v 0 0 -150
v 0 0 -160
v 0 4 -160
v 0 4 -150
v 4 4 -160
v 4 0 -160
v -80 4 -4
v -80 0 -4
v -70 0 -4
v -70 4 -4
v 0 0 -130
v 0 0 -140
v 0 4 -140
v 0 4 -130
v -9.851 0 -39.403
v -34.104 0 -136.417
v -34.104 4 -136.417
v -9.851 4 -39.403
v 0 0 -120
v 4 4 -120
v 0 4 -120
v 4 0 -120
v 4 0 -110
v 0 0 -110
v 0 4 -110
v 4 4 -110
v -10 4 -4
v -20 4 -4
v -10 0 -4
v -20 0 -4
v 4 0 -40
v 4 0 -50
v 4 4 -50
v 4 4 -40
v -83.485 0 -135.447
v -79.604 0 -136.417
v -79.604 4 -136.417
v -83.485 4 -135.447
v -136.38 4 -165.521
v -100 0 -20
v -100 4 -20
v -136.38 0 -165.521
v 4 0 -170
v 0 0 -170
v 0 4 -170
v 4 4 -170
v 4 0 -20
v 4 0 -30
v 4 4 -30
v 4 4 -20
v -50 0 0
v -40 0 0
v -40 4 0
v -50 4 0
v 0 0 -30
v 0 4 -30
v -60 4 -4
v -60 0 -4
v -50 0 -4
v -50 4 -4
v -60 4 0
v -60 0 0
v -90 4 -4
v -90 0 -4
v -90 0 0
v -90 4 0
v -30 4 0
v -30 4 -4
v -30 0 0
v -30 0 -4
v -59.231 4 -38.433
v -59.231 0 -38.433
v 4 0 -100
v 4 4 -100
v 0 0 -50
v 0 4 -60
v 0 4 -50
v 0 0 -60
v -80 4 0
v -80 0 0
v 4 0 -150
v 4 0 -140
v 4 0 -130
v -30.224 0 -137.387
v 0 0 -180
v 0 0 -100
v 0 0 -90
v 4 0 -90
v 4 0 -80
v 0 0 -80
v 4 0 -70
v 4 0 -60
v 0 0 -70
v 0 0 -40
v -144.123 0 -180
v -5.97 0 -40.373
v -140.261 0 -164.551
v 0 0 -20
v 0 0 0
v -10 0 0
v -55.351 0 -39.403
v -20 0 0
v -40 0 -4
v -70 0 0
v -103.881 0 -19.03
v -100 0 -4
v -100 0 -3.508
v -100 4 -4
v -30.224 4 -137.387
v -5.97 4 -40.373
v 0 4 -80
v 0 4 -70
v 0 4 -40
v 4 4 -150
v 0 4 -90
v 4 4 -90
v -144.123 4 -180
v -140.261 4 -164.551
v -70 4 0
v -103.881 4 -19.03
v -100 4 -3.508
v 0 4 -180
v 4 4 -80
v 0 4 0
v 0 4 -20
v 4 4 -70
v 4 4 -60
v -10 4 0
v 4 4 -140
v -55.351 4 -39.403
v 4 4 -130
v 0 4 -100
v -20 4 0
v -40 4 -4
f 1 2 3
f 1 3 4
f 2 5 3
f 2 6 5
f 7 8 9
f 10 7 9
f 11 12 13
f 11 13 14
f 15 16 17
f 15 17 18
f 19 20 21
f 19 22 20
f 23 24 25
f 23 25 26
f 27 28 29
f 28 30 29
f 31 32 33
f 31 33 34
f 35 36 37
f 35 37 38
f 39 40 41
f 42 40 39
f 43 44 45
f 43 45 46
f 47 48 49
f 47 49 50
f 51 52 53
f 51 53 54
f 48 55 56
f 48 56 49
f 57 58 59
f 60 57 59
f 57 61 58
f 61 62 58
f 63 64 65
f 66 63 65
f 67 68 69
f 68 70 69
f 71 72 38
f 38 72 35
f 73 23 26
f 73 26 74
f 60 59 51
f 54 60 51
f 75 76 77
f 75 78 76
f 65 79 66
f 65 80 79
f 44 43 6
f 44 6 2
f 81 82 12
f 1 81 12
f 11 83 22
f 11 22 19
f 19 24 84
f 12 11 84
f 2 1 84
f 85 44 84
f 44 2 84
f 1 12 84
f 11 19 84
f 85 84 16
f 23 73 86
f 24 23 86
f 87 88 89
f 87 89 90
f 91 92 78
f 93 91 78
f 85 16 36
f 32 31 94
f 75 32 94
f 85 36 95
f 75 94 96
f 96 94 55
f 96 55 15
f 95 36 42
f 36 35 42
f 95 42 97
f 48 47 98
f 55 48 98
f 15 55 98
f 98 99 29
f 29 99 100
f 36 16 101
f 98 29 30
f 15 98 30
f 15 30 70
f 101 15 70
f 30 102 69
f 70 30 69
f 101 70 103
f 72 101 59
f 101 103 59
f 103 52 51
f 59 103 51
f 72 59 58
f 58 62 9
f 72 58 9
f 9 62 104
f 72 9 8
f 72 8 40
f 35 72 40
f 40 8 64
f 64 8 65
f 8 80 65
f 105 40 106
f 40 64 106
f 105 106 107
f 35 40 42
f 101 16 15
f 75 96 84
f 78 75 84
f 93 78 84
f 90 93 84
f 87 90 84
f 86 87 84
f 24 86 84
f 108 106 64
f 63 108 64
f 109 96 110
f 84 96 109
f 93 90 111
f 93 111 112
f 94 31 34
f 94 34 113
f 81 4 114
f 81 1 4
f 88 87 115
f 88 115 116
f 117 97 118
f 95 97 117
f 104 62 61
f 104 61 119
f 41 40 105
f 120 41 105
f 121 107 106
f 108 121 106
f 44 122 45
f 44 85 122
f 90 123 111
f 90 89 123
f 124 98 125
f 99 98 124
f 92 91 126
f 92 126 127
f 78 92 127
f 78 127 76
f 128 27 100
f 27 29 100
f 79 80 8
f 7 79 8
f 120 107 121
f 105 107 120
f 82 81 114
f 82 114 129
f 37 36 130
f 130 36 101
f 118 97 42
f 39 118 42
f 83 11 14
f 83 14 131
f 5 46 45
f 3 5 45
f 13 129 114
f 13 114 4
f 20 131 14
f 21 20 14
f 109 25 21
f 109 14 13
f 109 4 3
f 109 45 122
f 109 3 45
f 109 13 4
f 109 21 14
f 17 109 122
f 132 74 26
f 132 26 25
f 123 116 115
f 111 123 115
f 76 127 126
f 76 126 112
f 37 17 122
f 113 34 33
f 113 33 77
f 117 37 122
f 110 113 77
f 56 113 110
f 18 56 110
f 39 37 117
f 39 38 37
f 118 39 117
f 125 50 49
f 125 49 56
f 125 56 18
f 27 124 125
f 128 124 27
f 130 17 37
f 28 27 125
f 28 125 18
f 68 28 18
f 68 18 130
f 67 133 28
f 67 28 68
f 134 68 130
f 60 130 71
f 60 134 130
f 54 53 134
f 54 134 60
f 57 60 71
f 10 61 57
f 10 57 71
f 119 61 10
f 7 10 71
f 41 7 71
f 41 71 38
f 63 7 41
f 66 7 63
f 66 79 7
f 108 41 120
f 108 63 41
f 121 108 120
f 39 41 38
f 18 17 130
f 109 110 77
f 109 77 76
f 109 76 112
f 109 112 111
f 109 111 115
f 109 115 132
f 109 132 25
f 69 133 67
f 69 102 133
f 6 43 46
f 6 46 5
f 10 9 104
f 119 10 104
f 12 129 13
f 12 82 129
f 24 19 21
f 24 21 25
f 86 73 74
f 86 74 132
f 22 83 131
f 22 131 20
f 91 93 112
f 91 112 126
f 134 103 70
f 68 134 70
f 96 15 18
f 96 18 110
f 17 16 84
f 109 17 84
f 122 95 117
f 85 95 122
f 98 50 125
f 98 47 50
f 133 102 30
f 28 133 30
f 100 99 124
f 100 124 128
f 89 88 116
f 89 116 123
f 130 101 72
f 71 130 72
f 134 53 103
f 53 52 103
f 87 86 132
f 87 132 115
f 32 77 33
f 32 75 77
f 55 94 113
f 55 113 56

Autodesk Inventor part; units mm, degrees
ref_plane "YZ Plane" through (0, 0, 0) normal (1, 0, 0) x (0, 1, 0)
ref_plane "XZ Plane" through (0, 0, 0) normal (0, 1, 0) x (-1, 0, 0)
ref_plane "XY Plane" through (0, 0, 0) normal (0, 0, 1) x (1, 0, 0)
sketch "スケッチ1" plane through (0, 0, 0) normal (0, 1, 0) x (-1, 0, 0)
  line L0 (0, 0) -> (100, 0)
  line L1 (100, 0) -> (100, -180)
  line L2 (100, -180) -> (0, -180)
  line L3 (0, -180) -> (0, 0)
  line L4 (0, -170) -> (-4, -170)
  line L5 (-4, -170) -> (-4, -160)
  line L6 (-4, -160) -> (0, -160)
  line L7 (0, -160) -> (0, -170)
  line L8 (-4, -140) -> (0, -140)
  line L9 (-4, -150) -> (-4, -140)
  line L10 (0, -150) -> (-4, -150)
  line L11 (-4, -120) -> (0, -120)
  line L12 (-4, -130) -> (-4, -120)
  line L13 (0, -130) -> (-4, -130)
  line L14 (-4, -100) -> (0, -100)
  line L15 (-4, -110) -> (-4, -100)
  line L16 (0, -110) -> (-4, -110)
  line L17 (-4, -80) -> (0, -80)
  line L18 (-4, -90) -> (-4, -80)
  line L19 (0, -90) -> (-4, -90)
  line L20 (-4, -60) -> (0, -60)
  line L21 (-4, -70) -> (-4, -60)
  line L22 (0, -70) -> (-4, -70)
  line L23 (-4, -40) -> (0, -40)
  line L24 (-4, -50) -> (-4, -40)
  line L25 (0, -50) -> (-4, -50)
  line L26 (-4, -20) -> (0, -20)
  line L27 (-4, -30) -> (-4, -20)
  line L28 (0, -30) -> (-4, -30)
  line L29 (10, 0) -> (20, 0)
  line L30 (20, 0) -> (20, 4)
  line L31 (20, 4) -> (10, 4)
  line L32 (10, 4) -> (10, 0)
  line L33 (30, 4) -> (30, 0)
  line L34 (40, 4) -> (30, 4)
  line L35 (40, 0) -> (40, 4)
  line L36 (50, 4) -> (50, 0)
  line L37 (60, 4) -> (50, 4)
  line L38 (60, 0) -> (60, 4)
  line L39 (70, 4) -> (70, 0)
  line L40 (80, 4) -> (70, 4)
  line L41 (80, 0) -> (80, 4)
  line L42 (45, -180) -> (5, -20)
  line L43 (90.5, -180) -> (50.5, -20)
  line L44 (100, -20) -> (140, -180)
  line L45 (100, -180) -> (140, -180)
  line L46 (100, -3.5076) -> (144.2959, -180.6913)
  line L47 (140, -180) -> (144.1231, -180)
  line L48 (50.5, -20) -> (54.3806, -19.0299)
  line L49 (54.3806, -19.0299) -> (94.6231, -180)
  line L50 (5, -20) -> (1.1194, -20.9701)
  line L51 (1.1194, -20.9701) -> (40.8769, -180)
  line L52 (34.1043, -136.4171) -> (30.2237, -137.3872)
  line L53 (9.8507, -39.4029) -> (5.9701, -40.373)
  line L54 (55.3507, -39.4029) -> (59.2313, -38.4327)
  line L55 (79.6043, -136.4171) -> (83.4848, -135.447)
  line L56 (100, -20) -> (103.8806, -19.0299)
  line L57 (103.8806, -19.0299) -> (140.2609, -164.5512)
  line L58 (140.2609, -164.5512) -> (136.3803, -165.5214)
  line L59 (20, 0) -> (20, -4)
  line L60 (10, -4) -> (10, 0)
  line L61 (30, -4) -> (30, 0)
  line L62 (40, -4) -> (30, -4)
  line L63 (40, 0) -> (40, -4)
  line L64 (50, -4) -> (50, 0)
  line L65 (60, 0) -> (60, -4)
  line L66 (70, -4) -> (70, 0)
  line L67 (80, 0) -> (80, -4)
  line L68 (80, -4) -> (70, -4)
  line L69 (60, -4) -> (50, -4)
  line L70 (20, -4) -> (10, -4)
  line L71 (90, 0) -> (100, 0)
  line L72 (100, 0) -> (100, -4)
  line L73 (100, -4) -> (90, -4)
  line L74 (90, -4) -> (90, 0)
  point P0 (10, 2)
  point P1 (30, 2)
  point P2 (50, 2)
  point P3 (70, 2)
  point P4 (57.291, -38.9178)
  point P5 (0, -20)
  point P6 (0, -40)
  point P7 (0, -60)
  point P8 (0, -80)
  point P9 (0, -100)
  point P10 (0, -120)
  point P11 (0, -140)
  point P12 (0, -160)
  point P13 (50, -2)
  dimension "d0" = 100
  dimension "d1" = 180
  dimension "d2" = 4
  dimension "d3" = 10
  dimension "d4" = 10
  dimension "d7" = 20
  dimension "d12" = 10
  dimension "d13" = 4
  dimension "d14" = 10
  dimension "d17" = 20
  dimension "d22" = 45
  dimension "d23" = 5
  dimension "d24" = 20
  dimension "d26" = 45.5
  dimension "d27" = 45.5
  dimension "d28" = 20
  dimension "d29" = 49.5
  dimension "d30" = 49.5
  dimension "d32" = 4
  dimension "d33" = 4
  dimension "d34" = 4
  dimension "d35" = 20
  dimension "d36" = 100
  dimension "d37" = 20
  dimension "d38" = 100
  dimension "d39" = 150
  dimension "d42" = 10
  dimension "d43" = 4
  dimension "d44" = 10
extrude "押し出し1" add sketch "スケッチ1" along normal blind 4 contours L0 L60 L70 L59 L61 L62 L63 L64 L69 L65 L66 L68 L67 L74 L73 L1 L2 L49 L48 L43 L42 L50 L51 L3 | L3 L28 L27 L26 | L3 L25 L24 L23 | L3 L22 L21 L20 | L3 L19 L18 L17 | L3 L16 L15 L14 | L46 L56 L1 | L3 L13 L12 L11 | L44 L45 L1 | L46 L47 L44 L58 | L3 L10 L9 L8 | L2 L43 L55 L49 | L3 L4 L5 L6 | L2 L51 L52 L42 | L54 L43 L48 L49 | L53 L51 L50 L42
properties part number "ER_lipo_side_2" material "木材 (オーク)"
